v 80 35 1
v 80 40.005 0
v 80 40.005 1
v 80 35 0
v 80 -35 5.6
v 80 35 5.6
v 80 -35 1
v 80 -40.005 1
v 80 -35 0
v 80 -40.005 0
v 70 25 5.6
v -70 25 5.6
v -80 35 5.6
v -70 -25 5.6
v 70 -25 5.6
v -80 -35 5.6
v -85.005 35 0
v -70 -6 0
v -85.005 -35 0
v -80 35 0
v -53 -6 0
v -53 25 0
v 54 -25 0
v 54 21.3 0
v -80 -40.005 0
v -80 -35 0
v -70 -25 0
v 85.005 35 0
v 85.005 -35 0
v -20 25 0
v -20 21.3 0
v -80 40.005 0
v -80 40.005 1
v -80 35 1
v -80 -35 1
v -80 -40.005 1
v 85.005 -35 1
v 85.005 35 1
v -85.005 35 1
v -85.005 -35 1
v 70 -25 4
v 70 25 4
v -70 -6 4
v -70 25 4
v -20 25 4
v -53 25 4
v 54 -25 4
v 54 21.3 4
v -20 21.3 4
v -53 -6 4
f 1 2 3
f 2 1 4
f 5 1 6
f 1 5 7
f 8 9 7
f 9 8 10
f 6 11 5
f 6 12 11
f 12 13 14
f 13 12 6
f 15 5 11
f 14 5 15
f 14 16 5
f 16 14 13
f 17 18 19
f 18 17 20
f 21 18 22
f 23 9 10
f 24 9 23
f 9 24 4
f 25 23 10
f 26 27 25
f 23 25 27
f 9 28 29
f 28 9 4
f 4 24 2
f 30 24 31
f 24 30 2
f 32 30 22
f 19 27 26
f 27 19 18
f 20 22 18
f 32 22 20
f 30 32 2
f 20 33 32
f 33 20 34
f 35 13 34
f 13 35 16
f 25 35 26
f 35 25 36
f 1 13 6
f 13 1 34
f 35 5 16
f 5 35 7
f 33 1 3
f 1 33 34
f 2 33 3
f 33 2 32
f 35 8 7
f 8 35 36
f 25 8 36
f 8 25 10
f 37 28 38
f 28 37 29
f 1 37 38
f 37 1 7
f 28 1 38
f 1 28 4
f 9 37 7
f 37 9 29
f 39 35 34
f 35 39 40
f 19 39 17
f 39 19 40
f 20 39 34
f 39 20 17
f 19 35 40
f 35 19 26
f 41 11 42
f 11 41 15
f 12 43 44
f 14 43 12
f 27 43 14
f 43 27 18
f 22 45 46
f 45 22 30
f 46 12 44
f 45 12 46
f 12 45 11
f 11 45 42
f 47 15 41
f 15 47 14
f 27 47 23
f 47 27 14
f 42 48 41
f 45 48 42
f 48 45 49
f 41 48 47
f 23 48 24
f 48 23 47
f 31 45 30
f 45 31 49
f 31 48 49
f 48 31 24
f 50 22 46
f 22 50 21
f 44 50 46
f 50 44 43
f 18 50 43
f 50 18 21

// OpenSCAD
/* File: ~/GliderWinchItems/BMS/hw/stncl-14921.scad
  * SMD Stencilling frames for MAX14921
  * Latest edit: 20230223
 */
 
 $fn=20;
  
module rounded_rectangle_hull(wid,slen,ht,rad)
{
 hull()
 {    
    translate([-wid/2+rad,rad,0])
        cylinder(r=rad,h=ht,center=false);

   translate([ wid/2-rad,rad,0])
        cylinder(r=rad,h=ht,center=false);

    translate([-wid/2+rad,slen-rad,0])
        cylinder(r=rad,h=ht,center=false);
    
    translate([ wid/2-rad,slen-rad,0])
        cylinder(r=rad,h=ht,center=false);
 }
}

mlen = 160; 
mwid = 70;
mthk = 4;    // Space under pcb
pthk = 1.6;  // PCB thickness
lipwid = 10; // Lip width
lipthk = 1;
plen = 140;
pwid = 50;

tthk = mthk+pthk; // Total thickness

module post(a,ll,ww)
{
    translate(a)
    {
        translate([-plen/2+ll/2,0,mthk/2])
        cube([ll,ww,mthk],center=true);
    }
}
module main()
{
    difference()
    {
        union()
        {
          translate([0,0,tthk/2])
          cube([mlen,mwid,tthk],center=true);
           
          translate([0,mwid/2,lipthk/2])
          cube([mlen,lipwid+.01,lipthk],center=true); 
            
          translate([0,-mwid/2,lipthk/2])
          cube([mlen,lipwid+.01,lipthk],center=true);             

          translate([mlen/2,0,lipthk/2])
          cube([lipwid+.01,mwid,lipthk],center=true); 

          translate([-mlen/2,0,lipthk/2])
          cube([lipwid+.01,mwid,lipthk],center=true);   
        }
        union()
        {
          {  
            translate([0,0,tthk - pthk/2])
            cube([plen,pwid,50],center=true);
              
          }
        }
    }
}

main();

p1 = 16;
post([140-p1,0,0],p1,50);
post([140-90,pwid/2-3.7/2,0],90,3.7);
post([0,pwid/2-31/2,0],17,31);
